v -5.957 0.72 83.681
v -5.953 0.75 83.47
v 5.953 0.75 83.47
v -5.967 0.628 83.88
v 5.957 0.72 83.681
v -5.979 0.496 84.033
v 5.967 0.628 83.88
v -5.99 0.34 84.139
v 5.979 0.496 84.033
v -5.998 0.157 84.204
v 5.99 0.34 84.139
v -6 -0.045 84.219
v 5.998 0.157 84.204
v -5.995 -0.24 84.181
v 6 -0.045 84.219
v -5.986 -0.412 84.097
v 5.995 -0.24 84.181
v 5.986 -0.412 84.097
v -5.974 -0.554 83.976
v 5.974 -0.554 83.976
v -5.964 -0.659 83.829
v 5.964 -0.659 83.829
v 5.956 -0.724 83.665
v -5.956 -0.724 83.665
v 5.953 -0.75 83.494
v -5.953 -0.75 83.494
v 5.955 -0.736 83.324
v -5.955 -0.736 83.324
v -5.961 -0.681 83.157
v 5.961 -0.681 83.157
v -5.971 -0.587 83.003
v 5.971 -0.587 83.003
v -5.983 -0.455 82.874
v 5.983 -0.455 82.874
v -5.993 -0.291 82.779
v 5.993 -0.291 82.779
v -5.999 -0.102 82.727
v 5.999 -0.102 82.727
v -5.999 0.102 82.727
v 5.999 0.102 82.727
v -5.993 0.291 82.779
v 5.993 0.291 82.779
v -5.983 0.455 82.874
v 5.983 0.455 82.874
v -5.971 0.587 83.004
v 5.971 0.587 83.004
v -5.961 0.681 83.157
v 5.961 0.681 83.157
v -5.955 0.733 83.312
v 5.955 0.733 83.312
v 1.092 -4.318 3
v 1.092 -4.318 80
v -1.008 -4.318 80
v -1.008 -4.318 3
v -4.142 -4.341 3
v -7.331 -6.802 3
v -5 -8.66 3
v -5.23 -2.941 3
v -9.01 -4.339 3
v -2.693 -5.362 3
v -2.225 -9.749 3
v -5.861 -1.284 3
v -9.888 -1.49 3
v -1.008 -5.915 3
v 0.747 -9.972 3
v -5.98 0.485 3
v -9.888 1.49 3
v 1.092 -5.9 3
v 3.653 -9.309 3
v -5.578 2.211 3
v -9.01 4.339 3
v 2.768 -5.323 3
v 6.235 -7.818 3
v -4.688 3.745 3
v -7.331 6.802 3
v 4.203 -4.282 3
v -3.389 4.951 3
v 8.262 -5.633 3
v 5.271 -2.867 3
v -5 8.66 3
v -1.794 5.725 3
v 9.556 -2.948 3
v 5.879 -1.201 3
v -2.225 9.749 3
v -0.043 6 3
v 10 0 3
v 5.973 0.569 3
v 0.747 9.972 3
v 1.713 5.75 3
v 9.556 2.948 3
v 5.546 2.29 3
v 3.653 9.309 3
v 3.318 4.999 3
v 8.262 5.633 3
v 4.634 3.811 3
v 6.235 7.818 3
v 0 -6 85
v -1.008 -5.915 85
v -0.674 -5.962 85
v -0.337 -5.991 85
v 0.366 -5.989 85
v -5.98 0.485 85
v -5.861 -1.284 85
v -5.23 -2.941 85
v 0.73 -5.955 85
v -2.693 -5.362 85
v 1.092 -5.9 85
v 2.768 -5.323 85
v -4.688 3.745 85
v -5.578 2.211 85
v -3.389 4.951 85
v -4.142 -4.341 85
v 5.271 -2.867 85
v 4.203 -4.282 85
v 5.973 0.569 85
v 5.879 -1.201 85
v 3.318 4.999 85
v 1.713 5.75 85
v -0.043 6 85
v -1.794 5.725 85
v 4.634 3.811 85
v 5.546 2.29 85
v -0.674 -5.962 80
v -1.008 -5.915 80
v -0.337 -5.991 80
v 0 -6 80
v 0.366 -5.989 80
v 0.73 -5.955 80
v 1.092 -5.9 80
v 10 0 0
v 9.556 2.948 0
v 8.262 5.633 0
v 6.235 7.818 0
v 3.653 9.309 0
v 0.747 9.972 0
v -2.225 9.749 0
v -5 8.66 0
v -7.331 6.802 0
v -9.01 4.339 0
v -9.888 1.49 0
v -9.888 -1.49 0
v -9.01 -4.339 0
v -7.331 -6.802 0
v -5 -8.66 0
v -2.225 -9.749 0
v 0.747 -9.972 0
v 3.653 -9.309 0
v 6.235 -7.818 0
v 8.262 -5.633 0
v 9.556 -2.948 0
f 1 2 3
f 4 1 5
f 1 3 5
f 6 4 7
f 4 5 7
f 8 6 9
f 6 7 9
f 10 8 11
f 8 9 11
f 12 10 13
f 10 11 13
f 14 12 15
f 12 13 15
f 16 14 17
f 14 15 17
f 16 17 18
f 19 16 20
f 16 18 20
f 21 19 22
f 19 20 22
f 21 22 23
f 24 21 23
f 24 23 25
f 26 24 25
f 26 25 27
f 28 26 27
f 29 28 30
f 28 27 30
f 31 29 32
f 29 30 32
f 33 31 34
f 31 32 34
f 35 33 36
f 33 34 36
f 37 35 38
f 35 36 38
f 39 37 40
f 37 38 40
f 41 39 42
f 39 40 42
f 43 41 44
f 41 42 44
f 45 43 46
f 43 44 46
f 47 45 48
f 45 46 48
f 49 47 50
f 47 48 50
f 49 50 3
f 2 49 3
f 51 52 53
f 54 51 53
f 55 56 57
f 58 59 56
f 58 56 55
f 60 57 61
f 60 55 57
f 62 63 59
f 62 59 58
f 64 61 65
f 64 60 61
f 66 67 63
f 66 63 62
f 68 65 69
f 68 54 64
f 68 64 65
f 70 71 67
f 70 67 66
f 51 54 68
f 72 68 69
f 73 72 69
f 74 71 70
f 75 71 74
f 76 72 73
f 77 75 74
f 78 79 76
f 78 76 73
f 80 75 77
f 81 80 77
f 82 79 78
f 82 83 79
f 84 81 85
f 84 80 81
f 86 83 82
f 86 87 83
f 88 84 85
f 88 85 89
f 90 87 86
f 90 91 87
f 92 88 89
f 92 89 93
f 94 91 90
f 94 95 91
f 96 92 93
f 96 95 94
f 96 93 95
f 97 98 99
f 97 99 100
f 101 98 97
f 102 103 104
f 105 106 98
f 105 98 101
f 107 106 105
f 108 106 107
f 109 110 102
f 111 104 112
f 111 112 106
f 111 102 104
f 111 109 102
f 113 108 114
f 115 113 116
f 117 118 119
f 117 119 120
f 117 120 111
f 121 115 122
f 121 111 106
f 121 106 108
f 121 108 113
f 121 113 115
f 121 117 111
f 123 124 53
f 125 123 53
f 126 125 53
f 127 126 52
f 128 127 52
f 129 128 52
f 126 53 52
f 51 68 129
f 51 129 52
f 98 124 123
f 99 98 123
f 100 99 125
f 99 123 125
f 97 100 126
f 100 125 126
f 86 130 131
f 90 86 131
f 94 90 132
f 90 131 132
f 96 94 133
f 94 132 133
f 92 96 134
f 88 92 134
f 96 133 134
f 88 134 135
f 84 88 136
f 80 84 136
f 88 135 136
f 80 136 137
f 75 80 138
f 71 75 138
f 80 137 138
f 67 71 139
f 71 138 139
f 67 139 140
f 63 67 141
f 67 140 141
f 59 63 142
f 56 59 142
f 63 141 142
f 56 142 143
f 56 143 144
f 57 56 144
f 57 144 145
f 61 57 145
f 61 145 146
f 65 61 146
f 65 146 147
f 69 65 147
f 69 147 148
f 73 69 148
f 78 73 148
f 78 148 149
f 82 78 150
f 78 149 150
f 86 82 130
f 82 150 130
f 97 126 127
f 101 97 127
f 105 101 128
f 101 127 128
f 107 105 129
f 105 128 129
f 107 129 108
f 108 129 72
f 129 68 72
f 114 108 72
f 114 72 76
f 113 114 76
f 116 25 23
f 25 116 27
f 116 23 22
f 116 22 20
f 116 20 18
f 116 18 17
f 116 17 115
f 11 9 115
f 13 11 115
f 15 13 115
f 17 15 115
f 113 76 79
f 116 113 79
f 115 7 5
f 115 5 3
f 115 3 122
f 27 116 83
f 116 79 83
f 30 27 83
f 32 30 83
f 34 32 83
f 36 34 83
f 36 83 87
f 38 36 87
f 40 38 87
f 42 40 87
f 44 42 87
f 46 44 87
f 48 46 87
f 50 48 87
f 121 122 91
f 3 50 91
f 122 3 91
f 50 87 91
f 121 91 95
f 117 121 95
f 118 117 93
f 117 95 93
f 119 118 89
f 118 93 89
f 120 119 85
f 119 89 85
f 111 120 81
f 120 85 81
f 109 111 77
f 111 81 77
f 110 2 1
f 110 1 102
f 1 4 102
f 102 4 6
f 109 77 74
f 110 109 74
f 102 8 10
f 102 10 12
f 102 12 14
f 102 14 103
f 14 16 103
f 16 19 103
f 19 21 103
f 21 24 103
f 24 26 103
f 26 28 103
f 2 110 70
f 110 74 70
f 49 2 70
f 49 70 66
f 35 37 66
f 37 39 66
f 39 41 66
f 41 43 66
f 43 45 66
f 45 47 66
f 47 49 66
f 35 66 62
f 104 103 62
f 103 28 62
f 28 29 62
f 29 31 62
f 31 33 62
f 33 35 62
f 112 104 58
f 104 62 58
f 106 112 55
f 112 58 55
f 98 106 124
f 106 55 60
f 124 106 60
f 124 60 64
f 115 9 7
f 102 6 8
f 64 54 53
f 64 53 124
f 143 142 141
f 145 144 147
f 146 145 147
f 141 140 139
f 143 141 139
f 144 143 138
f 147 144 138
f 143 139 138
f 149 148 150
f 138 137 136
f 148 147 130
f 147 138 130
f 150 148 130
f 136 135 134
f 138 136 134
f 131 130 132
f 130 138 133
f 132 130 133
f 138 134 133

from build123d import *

# Parameters (mm, degrees)
F1_DEPTH = 85
F0_R     = 10
F2_DEPTH = 3
F3_R     = 0.75
F4_DEPTH = 15
F5_START = 3
F5_DEPTH = 77


with BuildPart() as f1:
    # F0 (on Top) → F1 (new body)
    with BuildSketch(Plane.XY):
        with BuildLine():
            Line((-1.0081231615, -4.3175521048), (-1.0081231615, -5.9147009807))
            ThreePointArc((-1.0081231615, -5.9147009807), (-0.5058626868, -5.9786372145), (0, -6))
            Line((0, -6), (0, -4.3175521048))
            Line((0, -4.3175521048), (-1.0081231615, -4.3175521048))
        make_face()
        with BuildLine():
            ThreePointArc((0, -6), (0.5482317643, -5.9749009977), (1.0918768385, -5.8998139775))
            Line((1.0918768385, -5.8998139775), (1.0918768385, -4.3175521048))
            Line((1.0918768385, -4.3175521048), (0, -4.3175521048))
            Line((0, -4.3175521048), (0, -6))
        make_face()
        with BuildLine():
            ThreePointArc((1.0918768385, -5.8998139775), (4.6125514106, -3.8372346142), (6, 0))
            ThreePointArc((6, 0), (-3.8698359804, 4.5852338528), (-1.0081231615, -5.9147009807))
            Line((-1.0081231615, -5.9147009807), (-1.0081231615, -4.3175521048))
            Line((-1.0081231615, -4.3175521048), (0, -4.3175521048))
            Line((0, -4.3175521048), (1.0918768385, -4.3175521048))
            Line((1.0918768385, -4.3175521048), (1.0918768385, -5.8998139775))
        make_face()
    extrude(amount=F1_DEPTH)

    # F0 (on Top) → F2 (join)
    with BuildSketch(Plane.XY):
        Circle(F0_R)
        with BuildLine():
            ThreePointArc((-1.0081231615, -5.9147009807), (-3.8698359804, 4.5852338528), (6, 0))
            ThreePointArc((6, 0), (4.6125514106, -3.8372346142), (1.0918768385, -5.8998139775))
            ThreePointArc((1.0918768385, -5.8998139775), (0.5482317643, -5.9749009977), (0, -6))
            ThreePointArc((0, -6), (-0.5058626868, -5.9786372145), (-1.0081231615, -5.9147009807))
        make_face(mode=Mode.SUBTRACT)
    extrude(amount=F2_DEPTH)

    # F3 (on Right) → F4 (cut, symmetric)
    with BuildSketch(Plane.YZ):
        with Locations((0, 83.4703872204)):
            Circle(F3_R)
    extrude(amount=F4_DEPTH, both=True, mode=Mode.SUBTRACT)

    # F0 (on Top) → F5 (cut)
    with BuildSketch(Plane.XY.offset(F5_START)):
        with BuildLine():
            Line((-1.0081231615, -4.3175521048), (-1.0081231615, -5.9147009807))
            ThreePointArc((-1.0081231615, -5.9147009807), (-0.5058626868, -5.9786372145), (0, -6))
            Line((0, -6), (0, -4.3175521048))
            Line((0, -4.3175521048), (-1.0081231615, -4.3175521048))
        make_face()
        with BuildLine():
            ThreePointArc((0, -6), (0.5482317643, -5.9749009977), (1.0918768385, -5.8998139775))
            Line((1.0918768385, -5.8998139775), (1.0918768385, -4.3175521048))
            Line((1.0918768385, -4.3175521048), (0, -4.3175521048))
            Line((0, -4.3175521048), (0, -6))
        make_face()
    extrude(amount=F5_DEPTH, mode=Mode.SUBTRACT)


solid = f1.part
